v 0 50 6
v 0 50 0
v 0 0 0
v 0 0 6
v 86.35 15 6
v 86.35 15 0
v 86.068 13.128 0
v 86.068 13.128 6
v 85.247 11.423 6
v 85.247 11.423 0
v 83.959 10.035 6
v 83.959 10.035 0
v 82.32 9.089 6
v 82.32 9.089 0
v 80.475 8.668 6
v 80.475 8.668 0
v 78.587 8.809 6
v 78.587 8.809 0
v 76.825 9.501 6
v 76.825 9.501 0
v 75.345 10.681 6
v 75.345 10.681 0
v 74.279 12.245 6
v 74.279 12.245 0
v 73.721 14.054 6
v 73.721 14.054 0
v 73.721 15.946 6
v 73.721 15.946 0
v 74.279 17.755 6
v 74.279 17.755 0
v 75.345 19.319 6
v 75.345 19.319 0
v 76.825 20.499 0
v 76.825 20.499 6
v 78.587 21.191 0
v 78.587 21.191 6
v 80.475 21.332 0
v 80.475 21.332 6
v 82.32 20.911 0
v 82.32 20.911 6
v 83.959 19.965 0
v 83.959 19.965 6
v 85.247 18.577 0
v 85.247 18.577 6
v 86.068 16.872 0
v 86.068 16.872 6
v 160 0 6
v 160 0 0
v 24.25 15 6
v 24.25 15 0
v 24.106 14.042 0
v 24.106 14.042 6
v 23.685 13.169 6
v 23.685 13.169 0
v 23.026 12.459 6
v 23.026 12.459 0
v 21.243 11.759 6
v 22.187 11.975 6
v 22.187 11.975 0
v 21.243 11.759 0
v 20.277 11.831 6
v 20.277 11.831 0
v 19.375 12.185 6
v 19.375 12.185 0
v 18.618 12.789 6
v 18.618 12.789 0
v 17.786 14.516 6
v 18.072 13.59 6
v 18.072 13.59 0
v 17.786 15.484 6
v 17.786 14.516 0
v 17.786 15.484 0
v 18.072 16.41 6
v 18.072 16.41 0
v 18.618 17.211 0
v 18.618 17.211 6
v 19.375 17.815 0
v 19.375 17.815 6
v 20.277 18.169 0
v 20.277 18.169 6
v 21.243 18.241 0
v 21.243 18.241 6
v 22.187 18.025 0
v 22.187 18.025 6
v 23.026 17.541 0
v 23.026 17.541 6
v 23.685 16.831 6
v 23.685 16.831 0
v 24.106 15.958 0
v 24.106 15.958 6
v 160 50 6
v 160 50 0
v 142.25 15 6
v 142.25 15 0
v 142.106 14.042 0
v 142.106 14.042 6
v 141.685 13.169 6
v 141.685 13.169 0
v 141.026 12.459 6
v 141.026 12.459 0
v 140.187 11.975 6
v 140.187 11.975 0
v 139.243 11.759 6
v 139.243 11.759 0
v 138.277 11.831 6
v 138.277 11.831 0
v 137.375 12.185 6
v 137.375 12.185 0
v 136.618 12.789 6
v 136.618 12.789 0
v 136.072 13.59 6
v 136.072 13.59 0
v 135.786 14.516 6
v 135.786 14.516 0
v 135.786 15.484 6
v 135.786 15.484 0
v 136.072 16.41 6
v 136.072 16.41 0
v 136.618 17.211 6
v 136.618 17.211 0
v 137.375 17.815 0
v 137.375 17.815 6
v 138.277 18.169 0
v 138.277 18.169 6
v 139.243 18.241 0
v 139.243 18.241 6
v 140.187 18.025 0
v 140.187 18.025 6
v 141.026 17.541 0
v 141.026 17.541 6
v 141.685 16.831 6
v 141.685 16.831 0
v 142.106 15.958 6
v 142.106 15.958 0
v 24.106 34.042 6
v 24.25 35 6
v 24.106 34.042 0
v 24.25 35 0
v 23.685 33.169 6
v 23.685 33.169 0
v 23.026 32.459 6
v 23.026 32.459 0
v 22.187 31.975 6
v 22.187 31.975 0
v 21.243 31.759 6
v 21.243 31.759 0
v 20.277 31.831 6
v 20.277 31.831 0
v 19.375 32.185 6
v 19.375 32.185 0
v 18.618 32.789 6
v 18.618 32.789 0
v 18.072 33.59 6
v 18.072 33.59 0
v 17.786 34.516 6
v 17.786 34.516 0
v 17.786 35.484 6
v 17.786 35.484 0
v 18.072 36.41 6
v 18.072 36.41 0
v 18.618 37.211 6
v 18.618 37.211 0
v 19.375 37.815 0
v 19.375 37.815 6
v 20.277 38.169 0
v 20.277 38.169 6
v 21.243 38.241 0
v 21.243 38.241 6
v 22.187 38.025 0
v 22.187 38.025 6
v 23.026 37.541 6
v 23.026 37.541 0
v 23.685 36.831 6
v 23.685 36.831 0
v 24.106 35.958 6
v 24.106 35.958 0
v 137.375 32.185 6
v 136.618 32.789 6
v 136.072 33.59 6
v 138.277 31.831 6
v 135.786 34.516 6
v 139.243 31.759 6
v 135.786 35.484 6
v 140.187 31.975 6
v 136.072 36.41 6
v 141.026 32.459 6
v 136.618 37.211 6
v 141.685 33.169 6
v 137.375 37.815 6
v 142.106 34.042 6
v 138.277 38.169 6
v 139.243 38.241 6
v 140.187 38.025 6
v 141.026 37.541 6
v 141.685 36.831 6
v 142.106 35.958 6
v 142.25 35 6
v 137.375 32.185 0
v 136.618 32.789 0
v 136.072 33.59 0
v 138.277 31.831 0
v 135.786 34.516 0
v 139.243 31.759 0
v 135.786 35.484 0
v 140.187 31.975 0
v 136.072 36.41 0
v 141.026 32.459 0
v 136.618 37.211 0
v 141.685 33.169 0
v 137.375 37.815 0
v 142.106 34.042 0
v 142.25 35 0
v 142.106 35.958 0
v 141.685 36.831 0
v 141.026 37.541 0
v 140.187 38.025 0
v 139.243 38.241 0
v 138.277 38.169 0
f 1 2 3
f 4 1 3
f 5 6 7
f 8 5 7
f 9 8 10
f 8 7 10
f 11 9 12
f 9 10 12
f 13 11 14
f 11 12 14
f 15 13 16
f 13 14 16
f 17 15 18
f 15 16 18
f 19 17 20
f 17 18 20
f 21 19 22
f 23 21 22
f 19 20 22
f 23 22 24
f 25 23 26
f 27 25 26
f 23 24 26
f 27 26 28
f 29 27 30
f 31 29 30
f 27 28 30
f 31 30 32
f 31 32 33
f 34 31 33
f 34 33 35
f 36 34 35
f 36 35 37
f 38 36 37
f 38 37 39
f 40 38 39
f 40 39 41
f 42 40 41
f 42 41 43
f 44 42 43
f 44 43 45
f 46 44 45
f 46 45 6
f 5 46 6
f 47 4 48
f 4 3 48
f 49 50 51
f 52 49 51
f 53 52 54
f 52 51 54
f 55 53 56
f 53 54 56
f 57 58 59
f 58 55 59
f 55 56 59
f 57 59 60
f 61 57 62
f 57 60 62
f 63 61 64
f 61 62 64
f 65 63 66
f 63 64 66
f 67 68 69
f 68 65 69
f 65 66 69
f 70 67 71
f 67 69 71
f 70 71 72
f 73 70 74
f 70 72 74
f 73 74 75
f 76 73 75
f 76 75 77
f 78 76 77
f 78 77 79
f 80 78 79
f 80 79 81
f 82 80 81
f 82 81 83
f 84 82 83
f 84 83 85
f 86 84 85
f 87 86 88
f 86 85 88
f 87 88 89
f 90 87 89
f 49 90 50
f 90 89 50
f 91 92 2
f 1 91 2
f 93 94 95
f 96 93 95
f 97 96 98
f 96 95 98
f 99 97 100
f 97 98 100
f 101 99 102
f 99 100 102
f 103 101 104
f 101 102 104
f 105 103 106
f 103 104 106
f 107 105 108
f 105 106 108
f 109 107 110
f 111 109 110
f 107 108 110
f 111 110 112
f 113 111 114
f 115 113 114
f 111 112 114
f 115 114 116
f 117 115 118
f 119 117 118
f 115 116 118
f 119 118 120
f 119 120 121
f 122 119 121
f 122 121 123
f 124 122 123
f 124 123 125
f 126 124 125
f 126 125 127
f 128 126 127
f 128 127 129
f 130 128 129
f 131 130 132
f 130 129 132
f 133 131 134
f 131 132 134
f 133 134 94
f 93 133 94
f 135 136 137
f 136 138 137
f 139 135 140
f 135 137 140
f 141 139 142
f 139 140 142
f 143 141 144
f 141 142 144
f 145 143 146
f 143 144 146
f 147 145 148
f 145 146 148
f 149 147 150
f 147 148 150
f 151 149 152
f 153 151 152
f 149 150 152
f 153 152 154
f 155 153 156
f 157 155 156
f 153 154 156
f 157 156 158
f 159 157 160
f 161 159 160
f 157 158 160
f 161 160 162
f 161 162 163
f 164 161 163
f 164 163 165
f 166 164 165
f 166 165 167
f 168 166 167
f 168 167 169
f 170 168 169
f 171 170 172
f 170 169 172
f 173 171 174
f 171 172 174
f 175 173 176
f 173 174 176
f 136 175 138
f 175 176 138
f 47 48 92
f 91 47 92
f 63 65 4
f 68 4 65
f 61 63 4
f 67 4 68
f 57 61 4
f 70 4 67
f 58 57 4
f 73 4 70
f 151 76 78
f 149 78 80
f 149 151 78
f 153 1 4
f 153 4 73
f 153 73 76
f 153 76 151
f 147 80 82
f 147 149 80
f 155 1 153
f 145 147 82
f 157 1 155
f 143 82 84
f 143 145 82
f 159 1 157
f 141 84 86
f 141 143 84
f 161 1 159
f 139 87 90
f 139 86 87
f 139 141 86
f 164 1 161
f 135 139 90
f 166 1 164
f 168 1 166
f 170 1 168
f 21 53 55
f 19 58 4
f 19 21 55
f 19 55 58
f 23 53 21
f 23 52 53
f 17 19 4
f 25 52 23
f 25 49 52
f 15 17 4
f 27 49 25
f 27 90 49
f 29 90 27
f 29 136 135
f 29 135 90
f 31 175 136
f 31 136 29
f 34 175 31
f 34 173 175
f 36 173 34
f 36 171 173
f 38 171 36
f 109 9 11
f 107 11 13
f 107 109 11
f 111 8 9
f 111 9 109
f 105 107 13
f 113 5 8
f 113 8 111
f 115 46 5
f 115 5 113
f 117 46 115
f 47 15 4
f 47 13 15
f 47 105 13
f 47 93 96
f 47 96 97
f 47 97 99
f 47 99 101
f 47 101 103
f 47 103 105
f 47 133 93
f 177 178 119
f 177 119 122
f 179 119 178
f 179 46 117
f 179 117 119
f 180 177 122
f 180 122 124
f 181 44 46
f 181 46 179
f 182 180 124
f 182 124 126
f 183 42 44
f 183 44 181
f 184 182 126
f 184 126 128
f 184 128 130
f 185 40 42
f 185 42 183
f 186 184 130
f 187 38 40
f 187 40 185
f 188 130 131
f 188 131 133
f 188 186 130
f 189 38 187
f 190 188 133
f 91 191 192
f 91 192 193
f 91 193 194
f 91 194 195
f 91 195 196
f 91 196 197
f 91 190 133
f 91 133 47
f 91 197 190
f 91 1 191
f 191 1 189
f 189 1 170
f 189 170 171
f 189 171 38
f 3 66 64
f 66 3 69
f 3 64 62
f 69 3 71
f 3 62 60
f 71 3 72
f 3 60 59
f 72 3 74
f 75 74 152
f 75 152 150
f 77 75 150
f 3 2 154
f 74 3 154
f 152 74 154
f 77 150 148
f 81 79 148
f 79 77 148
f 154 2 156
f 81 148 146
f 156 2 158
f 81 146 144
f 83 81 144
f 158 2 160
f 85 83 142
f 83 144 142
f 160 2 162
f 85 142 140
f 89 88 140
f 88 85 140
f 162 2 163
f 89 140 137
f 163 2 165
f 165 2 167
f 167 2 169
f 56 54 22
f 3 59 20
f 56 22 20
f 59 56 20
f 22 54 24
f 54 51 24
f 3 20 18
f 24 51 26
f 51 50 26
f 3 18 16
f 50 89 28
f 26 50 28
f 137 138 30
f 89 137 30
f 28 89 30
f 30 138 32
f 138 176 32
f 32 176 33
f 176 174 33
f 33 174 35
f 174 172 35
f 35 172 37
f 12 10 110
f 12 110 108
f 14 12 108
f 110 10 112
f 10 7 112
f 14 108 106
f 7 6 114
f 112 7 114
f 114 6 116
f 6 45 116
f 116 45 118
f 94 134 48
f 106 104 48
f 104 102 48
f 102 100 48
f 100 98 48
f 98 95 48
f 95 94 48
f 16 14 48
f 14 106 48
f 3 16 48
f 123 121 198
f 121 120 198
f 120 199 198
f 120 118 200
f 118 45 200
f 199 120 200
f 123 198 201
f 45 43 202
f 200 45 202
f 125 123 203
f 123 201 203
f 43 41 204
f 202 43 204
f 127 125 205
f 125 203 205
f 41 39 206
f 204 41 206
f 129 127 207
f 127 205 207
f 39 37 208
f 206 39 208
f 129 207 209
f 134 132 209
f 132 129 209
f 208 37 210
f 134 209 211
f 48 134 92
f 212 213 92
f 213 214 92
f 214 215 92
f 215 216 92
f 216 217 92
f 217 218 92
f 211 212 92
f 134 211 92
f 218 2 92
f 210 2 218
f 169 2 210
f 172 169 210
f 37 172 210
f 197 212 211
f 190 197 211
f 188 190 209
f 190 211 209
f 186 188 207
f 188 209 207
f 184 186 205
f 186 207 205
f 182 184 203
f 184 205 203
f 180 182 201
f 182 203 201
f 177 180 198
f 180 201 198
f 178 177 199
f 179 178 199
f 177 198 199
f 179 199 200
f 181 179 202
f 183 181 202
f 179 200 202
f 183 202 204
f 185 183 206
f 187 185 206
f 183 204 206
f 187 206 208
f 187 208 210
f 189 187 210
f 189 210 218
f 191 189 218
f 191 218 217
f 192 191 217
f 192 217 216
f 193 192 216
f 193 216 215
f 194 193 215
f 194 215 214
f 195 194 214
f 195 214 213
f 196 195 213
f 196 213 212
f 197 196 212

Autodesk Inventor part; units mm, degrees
ref_plane "YZ Plane" through (0, 0, 0) normal (1, 0, 0) x (0, 1, 0)
ref_plane "XZ Plane" through (0, 0, 0) normal (0, 1, 0) x (-1, 0, 0)
ref_plane "XY Plane" through (0, 0, 0) normal (0, 0, 1) x (1, 0, 0)
sketch "Sketch1" plane through (0, 0, 0) normal (0, 0, 1) x (1, 0, 0)
  line L0 (0, 0) -> (160, 0)
  line L1 (160, 0) -> (160, 50)
  line L2 (160, 50) -> (0, 50)
  line L3 (0, 50) -> (0, 0)
  line L4 (0, 0) -> (21, 0)
  circle A0 centre (21, 35) radius 3.25
  circle A1 centre (21, 15) radius 3.25
  circle A2 centre (139, 15) radius 3.25
  circle A3 centre (139, 35) radius 3.25
  circle A4 centre (80, 15) radius 6.35
  point P0 (80, 25)
  point P1 (80, 25)
  point P2 (80, 50)
  dimension "d0" = 160
  dimension "d1" = 50
  dimension "d2" = 21
  dimension "d5" = 6.5
  dimension "d6" = 6.5
  dimension "d13" = 20
  dimension "d14" = 15
  dimension "d15" = 21
  dimension "d19" = 360
  dimension "d23" = 80
  dimension "d24" = 12.7
  dimension "d25" = 35
extrude "Extrusion1" add sketch "Sketch1" along normal blind 6 contours L3 L2 L1 L0 | A0 | A2 | A3 | A4
extrude "Extrusion3" cut sketch "Sketch1" along normal blind 10 contours A0 | A2 | A3 | A4
sketch "Sketch4" plane through (0, 50, 0) normal (0, 1, 0) x (1, 0, 0)
  point P0 (0, 0)
properties part number "support plate 2"
